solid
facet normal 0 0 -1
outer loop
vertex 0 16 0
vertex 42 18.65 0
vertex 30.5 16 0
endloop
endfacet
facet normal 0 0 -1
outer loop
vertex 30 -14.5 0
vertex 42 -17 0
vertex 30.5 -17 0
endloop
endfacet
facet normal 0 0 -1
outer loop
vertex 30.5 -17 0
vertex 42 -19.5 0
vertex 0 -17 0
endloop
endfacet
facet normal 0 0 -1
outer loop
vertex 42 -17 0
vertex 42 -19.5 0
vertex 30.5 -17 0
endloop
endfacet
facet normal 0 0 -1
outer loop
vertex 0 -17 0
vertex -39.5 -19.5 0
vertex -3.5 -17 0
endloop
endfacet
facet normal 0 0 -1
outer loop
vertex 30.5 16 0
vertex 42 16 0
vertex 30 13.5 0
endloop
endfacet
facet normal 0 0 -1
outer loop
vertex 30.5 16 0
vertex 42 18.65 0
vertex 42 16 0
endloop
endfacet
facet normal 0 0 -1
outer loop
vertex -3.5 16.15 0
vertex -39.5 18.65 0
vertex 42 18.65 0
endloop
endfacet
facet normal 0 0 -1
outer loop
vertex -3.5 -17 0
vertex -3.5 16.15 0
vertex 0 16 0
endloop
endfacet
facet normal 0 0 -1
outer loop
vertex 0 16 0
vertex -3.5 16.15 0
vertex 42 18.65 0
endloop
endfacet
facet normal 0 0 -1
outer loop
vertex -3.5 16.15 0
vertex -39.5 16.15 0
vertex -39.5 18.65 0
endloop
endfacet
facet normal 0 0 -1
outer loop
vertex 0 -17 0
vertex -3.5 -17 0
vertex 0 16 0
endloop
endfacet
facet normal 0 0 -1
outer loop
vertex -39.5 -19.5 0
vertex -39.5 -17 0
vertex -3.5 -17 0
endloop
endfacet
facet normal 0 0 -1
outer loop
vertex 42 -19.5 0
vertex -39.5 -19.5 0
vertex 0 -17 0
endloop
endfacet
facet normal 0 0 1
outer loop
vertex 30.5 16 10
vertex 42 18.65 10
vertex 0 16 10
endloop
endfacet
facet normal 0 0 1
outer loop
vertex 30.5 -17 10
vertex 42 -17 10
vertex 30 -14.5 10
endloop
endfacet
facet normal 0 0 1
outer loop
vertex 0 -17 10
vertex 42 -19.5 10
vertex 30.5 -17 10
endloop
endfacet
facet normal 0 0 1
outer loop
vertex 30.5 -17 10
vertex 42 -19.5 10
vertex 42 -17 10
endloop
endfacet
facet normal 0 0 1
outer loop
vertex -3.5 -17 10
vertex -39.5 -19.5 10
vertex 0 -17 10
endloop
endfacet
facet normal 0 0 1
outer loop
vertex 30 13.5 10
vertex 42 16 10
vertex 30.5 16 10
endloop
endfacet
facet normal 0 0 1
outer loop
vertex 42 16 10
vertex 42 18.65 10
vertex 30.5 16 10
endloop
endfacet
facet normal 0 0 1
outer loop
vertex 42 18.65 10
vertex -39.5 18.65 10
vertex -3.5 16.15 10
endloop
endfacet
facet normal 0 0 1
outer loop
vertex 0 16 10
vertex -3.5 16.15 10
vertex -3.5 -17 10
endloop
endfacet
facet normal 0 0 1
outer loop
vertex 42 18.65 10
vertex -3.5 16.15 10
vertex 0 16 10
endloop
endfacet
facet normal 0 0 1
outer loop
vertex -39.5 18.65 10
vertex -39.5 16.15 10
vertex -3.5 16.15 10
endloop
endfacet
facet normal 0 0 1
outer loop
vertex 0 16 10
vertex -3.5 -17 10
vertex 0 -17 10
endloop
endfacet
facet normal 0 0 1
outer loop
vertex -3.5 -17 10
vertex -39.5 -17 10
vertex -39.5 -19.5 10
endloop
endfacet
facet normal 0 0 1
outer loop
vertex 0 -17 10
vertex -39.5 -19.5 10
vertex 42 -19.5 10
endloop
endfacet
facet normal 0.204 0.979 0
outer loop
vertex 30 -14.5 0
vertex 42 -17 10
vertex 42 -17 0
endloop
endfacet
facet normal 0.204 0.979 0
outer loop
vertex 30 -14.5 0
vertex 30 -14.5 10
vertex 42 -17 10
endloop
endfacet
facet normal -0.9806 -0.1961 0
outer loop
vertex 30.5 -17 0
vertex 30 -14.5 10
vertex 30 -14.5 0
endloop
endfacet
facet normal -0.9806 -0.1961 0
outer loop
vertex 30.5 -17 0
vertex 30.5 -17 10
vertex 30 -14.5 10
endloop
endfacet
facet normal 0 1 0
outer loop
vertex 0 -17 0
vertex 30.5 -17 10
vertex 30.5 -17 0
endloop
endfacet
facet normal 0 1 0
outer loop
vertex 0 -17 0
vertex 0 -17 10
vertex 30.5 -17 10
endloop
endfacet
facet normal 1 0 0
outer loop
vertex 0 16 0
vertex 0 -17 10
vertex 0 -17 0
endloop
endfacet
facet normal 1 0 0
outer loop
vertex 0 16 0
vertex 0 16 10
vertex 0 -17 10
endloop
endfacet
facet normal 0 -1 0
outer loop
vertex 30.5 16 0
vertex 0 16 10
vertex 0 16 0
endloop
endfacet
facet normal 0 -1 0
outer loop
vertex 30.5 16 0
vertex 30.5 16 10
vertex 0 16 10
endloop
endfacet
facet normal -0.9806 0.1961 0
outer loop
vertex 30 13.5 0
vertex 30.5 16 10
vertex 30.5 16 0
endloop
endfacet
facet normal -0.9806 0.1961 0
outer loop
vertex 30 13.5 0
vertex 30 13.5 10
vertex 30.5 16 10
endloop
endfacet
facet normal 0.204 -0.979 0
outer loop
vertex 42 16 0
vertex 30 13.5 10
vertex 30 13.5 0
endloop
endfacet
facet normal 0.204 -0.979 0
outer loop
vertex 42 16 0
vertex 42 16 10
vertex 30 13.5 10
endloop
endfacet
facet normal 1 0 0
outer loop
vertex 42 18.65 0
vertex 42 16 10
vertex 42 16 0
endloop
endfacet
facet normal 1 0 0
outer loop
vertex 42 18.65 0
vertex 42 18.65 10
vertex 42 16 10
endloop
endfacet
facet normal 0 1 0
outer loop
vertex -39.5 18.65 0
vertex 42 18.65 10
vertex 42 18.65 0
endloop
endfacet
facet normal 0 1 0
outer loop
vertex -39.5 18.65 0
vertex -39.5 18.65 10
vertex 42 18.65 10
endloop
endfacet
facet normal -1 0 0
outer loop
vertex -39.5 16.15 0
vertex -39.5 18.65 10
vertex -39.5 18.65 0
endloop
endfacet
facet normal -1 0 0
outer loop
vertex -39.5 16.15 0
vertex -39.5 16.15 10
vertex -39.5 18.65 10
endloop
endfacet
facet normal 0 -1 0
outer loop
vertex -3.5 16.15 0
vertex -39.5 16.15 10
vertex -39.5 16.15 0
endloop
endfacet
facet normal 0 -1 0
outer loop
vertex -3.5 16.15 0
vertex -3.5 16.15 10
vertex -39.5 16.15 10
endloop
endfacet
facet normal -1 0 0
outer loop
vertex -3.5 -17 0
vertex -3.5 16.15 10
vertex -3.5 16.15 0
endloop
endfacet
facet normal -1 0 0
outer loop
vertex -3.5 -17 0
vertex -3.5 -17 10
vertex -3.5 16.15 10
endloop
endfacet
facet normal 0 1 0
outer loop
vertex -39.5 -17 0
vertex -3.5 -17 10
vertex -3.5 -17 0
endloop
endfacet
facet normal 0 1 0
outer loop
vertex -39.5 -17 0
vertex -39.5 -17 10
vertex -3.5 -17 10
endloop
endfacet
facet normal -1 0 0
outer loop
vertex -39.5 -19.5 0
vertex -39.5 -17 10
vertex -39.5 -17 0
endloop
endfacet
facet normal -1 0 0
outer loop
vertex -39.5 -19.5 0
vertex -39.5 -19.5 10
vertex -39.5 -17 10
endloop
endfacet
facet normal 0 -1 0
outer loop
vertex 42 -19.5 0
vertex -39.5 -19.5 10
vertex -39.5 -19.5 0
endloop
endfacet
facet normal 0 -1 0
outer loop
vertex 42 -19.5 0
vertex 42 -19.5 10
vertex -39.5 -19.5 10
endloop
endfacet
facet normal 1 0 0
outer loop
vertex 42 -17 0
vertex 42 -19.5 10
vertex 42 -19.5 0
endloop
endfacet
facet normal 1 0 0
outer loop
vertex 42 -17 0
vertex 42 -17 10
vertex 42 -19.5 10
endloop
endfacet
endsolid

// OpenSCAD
translate([0,-17,0]) linear_extrude(10) {
    polygon([[0,0],[30.5,0],[30,2.5],[42,0],[42,-2.5],[-39.5,-2.5],[-39.5,0],[-3.5,0],[-3.5,33.15],[-39.5,33.15],[-39.5,35.65],[-3.5,35.65],[42,35.65],[42,33],[30,30.5],[30.5,33],[0,33]]);
}
